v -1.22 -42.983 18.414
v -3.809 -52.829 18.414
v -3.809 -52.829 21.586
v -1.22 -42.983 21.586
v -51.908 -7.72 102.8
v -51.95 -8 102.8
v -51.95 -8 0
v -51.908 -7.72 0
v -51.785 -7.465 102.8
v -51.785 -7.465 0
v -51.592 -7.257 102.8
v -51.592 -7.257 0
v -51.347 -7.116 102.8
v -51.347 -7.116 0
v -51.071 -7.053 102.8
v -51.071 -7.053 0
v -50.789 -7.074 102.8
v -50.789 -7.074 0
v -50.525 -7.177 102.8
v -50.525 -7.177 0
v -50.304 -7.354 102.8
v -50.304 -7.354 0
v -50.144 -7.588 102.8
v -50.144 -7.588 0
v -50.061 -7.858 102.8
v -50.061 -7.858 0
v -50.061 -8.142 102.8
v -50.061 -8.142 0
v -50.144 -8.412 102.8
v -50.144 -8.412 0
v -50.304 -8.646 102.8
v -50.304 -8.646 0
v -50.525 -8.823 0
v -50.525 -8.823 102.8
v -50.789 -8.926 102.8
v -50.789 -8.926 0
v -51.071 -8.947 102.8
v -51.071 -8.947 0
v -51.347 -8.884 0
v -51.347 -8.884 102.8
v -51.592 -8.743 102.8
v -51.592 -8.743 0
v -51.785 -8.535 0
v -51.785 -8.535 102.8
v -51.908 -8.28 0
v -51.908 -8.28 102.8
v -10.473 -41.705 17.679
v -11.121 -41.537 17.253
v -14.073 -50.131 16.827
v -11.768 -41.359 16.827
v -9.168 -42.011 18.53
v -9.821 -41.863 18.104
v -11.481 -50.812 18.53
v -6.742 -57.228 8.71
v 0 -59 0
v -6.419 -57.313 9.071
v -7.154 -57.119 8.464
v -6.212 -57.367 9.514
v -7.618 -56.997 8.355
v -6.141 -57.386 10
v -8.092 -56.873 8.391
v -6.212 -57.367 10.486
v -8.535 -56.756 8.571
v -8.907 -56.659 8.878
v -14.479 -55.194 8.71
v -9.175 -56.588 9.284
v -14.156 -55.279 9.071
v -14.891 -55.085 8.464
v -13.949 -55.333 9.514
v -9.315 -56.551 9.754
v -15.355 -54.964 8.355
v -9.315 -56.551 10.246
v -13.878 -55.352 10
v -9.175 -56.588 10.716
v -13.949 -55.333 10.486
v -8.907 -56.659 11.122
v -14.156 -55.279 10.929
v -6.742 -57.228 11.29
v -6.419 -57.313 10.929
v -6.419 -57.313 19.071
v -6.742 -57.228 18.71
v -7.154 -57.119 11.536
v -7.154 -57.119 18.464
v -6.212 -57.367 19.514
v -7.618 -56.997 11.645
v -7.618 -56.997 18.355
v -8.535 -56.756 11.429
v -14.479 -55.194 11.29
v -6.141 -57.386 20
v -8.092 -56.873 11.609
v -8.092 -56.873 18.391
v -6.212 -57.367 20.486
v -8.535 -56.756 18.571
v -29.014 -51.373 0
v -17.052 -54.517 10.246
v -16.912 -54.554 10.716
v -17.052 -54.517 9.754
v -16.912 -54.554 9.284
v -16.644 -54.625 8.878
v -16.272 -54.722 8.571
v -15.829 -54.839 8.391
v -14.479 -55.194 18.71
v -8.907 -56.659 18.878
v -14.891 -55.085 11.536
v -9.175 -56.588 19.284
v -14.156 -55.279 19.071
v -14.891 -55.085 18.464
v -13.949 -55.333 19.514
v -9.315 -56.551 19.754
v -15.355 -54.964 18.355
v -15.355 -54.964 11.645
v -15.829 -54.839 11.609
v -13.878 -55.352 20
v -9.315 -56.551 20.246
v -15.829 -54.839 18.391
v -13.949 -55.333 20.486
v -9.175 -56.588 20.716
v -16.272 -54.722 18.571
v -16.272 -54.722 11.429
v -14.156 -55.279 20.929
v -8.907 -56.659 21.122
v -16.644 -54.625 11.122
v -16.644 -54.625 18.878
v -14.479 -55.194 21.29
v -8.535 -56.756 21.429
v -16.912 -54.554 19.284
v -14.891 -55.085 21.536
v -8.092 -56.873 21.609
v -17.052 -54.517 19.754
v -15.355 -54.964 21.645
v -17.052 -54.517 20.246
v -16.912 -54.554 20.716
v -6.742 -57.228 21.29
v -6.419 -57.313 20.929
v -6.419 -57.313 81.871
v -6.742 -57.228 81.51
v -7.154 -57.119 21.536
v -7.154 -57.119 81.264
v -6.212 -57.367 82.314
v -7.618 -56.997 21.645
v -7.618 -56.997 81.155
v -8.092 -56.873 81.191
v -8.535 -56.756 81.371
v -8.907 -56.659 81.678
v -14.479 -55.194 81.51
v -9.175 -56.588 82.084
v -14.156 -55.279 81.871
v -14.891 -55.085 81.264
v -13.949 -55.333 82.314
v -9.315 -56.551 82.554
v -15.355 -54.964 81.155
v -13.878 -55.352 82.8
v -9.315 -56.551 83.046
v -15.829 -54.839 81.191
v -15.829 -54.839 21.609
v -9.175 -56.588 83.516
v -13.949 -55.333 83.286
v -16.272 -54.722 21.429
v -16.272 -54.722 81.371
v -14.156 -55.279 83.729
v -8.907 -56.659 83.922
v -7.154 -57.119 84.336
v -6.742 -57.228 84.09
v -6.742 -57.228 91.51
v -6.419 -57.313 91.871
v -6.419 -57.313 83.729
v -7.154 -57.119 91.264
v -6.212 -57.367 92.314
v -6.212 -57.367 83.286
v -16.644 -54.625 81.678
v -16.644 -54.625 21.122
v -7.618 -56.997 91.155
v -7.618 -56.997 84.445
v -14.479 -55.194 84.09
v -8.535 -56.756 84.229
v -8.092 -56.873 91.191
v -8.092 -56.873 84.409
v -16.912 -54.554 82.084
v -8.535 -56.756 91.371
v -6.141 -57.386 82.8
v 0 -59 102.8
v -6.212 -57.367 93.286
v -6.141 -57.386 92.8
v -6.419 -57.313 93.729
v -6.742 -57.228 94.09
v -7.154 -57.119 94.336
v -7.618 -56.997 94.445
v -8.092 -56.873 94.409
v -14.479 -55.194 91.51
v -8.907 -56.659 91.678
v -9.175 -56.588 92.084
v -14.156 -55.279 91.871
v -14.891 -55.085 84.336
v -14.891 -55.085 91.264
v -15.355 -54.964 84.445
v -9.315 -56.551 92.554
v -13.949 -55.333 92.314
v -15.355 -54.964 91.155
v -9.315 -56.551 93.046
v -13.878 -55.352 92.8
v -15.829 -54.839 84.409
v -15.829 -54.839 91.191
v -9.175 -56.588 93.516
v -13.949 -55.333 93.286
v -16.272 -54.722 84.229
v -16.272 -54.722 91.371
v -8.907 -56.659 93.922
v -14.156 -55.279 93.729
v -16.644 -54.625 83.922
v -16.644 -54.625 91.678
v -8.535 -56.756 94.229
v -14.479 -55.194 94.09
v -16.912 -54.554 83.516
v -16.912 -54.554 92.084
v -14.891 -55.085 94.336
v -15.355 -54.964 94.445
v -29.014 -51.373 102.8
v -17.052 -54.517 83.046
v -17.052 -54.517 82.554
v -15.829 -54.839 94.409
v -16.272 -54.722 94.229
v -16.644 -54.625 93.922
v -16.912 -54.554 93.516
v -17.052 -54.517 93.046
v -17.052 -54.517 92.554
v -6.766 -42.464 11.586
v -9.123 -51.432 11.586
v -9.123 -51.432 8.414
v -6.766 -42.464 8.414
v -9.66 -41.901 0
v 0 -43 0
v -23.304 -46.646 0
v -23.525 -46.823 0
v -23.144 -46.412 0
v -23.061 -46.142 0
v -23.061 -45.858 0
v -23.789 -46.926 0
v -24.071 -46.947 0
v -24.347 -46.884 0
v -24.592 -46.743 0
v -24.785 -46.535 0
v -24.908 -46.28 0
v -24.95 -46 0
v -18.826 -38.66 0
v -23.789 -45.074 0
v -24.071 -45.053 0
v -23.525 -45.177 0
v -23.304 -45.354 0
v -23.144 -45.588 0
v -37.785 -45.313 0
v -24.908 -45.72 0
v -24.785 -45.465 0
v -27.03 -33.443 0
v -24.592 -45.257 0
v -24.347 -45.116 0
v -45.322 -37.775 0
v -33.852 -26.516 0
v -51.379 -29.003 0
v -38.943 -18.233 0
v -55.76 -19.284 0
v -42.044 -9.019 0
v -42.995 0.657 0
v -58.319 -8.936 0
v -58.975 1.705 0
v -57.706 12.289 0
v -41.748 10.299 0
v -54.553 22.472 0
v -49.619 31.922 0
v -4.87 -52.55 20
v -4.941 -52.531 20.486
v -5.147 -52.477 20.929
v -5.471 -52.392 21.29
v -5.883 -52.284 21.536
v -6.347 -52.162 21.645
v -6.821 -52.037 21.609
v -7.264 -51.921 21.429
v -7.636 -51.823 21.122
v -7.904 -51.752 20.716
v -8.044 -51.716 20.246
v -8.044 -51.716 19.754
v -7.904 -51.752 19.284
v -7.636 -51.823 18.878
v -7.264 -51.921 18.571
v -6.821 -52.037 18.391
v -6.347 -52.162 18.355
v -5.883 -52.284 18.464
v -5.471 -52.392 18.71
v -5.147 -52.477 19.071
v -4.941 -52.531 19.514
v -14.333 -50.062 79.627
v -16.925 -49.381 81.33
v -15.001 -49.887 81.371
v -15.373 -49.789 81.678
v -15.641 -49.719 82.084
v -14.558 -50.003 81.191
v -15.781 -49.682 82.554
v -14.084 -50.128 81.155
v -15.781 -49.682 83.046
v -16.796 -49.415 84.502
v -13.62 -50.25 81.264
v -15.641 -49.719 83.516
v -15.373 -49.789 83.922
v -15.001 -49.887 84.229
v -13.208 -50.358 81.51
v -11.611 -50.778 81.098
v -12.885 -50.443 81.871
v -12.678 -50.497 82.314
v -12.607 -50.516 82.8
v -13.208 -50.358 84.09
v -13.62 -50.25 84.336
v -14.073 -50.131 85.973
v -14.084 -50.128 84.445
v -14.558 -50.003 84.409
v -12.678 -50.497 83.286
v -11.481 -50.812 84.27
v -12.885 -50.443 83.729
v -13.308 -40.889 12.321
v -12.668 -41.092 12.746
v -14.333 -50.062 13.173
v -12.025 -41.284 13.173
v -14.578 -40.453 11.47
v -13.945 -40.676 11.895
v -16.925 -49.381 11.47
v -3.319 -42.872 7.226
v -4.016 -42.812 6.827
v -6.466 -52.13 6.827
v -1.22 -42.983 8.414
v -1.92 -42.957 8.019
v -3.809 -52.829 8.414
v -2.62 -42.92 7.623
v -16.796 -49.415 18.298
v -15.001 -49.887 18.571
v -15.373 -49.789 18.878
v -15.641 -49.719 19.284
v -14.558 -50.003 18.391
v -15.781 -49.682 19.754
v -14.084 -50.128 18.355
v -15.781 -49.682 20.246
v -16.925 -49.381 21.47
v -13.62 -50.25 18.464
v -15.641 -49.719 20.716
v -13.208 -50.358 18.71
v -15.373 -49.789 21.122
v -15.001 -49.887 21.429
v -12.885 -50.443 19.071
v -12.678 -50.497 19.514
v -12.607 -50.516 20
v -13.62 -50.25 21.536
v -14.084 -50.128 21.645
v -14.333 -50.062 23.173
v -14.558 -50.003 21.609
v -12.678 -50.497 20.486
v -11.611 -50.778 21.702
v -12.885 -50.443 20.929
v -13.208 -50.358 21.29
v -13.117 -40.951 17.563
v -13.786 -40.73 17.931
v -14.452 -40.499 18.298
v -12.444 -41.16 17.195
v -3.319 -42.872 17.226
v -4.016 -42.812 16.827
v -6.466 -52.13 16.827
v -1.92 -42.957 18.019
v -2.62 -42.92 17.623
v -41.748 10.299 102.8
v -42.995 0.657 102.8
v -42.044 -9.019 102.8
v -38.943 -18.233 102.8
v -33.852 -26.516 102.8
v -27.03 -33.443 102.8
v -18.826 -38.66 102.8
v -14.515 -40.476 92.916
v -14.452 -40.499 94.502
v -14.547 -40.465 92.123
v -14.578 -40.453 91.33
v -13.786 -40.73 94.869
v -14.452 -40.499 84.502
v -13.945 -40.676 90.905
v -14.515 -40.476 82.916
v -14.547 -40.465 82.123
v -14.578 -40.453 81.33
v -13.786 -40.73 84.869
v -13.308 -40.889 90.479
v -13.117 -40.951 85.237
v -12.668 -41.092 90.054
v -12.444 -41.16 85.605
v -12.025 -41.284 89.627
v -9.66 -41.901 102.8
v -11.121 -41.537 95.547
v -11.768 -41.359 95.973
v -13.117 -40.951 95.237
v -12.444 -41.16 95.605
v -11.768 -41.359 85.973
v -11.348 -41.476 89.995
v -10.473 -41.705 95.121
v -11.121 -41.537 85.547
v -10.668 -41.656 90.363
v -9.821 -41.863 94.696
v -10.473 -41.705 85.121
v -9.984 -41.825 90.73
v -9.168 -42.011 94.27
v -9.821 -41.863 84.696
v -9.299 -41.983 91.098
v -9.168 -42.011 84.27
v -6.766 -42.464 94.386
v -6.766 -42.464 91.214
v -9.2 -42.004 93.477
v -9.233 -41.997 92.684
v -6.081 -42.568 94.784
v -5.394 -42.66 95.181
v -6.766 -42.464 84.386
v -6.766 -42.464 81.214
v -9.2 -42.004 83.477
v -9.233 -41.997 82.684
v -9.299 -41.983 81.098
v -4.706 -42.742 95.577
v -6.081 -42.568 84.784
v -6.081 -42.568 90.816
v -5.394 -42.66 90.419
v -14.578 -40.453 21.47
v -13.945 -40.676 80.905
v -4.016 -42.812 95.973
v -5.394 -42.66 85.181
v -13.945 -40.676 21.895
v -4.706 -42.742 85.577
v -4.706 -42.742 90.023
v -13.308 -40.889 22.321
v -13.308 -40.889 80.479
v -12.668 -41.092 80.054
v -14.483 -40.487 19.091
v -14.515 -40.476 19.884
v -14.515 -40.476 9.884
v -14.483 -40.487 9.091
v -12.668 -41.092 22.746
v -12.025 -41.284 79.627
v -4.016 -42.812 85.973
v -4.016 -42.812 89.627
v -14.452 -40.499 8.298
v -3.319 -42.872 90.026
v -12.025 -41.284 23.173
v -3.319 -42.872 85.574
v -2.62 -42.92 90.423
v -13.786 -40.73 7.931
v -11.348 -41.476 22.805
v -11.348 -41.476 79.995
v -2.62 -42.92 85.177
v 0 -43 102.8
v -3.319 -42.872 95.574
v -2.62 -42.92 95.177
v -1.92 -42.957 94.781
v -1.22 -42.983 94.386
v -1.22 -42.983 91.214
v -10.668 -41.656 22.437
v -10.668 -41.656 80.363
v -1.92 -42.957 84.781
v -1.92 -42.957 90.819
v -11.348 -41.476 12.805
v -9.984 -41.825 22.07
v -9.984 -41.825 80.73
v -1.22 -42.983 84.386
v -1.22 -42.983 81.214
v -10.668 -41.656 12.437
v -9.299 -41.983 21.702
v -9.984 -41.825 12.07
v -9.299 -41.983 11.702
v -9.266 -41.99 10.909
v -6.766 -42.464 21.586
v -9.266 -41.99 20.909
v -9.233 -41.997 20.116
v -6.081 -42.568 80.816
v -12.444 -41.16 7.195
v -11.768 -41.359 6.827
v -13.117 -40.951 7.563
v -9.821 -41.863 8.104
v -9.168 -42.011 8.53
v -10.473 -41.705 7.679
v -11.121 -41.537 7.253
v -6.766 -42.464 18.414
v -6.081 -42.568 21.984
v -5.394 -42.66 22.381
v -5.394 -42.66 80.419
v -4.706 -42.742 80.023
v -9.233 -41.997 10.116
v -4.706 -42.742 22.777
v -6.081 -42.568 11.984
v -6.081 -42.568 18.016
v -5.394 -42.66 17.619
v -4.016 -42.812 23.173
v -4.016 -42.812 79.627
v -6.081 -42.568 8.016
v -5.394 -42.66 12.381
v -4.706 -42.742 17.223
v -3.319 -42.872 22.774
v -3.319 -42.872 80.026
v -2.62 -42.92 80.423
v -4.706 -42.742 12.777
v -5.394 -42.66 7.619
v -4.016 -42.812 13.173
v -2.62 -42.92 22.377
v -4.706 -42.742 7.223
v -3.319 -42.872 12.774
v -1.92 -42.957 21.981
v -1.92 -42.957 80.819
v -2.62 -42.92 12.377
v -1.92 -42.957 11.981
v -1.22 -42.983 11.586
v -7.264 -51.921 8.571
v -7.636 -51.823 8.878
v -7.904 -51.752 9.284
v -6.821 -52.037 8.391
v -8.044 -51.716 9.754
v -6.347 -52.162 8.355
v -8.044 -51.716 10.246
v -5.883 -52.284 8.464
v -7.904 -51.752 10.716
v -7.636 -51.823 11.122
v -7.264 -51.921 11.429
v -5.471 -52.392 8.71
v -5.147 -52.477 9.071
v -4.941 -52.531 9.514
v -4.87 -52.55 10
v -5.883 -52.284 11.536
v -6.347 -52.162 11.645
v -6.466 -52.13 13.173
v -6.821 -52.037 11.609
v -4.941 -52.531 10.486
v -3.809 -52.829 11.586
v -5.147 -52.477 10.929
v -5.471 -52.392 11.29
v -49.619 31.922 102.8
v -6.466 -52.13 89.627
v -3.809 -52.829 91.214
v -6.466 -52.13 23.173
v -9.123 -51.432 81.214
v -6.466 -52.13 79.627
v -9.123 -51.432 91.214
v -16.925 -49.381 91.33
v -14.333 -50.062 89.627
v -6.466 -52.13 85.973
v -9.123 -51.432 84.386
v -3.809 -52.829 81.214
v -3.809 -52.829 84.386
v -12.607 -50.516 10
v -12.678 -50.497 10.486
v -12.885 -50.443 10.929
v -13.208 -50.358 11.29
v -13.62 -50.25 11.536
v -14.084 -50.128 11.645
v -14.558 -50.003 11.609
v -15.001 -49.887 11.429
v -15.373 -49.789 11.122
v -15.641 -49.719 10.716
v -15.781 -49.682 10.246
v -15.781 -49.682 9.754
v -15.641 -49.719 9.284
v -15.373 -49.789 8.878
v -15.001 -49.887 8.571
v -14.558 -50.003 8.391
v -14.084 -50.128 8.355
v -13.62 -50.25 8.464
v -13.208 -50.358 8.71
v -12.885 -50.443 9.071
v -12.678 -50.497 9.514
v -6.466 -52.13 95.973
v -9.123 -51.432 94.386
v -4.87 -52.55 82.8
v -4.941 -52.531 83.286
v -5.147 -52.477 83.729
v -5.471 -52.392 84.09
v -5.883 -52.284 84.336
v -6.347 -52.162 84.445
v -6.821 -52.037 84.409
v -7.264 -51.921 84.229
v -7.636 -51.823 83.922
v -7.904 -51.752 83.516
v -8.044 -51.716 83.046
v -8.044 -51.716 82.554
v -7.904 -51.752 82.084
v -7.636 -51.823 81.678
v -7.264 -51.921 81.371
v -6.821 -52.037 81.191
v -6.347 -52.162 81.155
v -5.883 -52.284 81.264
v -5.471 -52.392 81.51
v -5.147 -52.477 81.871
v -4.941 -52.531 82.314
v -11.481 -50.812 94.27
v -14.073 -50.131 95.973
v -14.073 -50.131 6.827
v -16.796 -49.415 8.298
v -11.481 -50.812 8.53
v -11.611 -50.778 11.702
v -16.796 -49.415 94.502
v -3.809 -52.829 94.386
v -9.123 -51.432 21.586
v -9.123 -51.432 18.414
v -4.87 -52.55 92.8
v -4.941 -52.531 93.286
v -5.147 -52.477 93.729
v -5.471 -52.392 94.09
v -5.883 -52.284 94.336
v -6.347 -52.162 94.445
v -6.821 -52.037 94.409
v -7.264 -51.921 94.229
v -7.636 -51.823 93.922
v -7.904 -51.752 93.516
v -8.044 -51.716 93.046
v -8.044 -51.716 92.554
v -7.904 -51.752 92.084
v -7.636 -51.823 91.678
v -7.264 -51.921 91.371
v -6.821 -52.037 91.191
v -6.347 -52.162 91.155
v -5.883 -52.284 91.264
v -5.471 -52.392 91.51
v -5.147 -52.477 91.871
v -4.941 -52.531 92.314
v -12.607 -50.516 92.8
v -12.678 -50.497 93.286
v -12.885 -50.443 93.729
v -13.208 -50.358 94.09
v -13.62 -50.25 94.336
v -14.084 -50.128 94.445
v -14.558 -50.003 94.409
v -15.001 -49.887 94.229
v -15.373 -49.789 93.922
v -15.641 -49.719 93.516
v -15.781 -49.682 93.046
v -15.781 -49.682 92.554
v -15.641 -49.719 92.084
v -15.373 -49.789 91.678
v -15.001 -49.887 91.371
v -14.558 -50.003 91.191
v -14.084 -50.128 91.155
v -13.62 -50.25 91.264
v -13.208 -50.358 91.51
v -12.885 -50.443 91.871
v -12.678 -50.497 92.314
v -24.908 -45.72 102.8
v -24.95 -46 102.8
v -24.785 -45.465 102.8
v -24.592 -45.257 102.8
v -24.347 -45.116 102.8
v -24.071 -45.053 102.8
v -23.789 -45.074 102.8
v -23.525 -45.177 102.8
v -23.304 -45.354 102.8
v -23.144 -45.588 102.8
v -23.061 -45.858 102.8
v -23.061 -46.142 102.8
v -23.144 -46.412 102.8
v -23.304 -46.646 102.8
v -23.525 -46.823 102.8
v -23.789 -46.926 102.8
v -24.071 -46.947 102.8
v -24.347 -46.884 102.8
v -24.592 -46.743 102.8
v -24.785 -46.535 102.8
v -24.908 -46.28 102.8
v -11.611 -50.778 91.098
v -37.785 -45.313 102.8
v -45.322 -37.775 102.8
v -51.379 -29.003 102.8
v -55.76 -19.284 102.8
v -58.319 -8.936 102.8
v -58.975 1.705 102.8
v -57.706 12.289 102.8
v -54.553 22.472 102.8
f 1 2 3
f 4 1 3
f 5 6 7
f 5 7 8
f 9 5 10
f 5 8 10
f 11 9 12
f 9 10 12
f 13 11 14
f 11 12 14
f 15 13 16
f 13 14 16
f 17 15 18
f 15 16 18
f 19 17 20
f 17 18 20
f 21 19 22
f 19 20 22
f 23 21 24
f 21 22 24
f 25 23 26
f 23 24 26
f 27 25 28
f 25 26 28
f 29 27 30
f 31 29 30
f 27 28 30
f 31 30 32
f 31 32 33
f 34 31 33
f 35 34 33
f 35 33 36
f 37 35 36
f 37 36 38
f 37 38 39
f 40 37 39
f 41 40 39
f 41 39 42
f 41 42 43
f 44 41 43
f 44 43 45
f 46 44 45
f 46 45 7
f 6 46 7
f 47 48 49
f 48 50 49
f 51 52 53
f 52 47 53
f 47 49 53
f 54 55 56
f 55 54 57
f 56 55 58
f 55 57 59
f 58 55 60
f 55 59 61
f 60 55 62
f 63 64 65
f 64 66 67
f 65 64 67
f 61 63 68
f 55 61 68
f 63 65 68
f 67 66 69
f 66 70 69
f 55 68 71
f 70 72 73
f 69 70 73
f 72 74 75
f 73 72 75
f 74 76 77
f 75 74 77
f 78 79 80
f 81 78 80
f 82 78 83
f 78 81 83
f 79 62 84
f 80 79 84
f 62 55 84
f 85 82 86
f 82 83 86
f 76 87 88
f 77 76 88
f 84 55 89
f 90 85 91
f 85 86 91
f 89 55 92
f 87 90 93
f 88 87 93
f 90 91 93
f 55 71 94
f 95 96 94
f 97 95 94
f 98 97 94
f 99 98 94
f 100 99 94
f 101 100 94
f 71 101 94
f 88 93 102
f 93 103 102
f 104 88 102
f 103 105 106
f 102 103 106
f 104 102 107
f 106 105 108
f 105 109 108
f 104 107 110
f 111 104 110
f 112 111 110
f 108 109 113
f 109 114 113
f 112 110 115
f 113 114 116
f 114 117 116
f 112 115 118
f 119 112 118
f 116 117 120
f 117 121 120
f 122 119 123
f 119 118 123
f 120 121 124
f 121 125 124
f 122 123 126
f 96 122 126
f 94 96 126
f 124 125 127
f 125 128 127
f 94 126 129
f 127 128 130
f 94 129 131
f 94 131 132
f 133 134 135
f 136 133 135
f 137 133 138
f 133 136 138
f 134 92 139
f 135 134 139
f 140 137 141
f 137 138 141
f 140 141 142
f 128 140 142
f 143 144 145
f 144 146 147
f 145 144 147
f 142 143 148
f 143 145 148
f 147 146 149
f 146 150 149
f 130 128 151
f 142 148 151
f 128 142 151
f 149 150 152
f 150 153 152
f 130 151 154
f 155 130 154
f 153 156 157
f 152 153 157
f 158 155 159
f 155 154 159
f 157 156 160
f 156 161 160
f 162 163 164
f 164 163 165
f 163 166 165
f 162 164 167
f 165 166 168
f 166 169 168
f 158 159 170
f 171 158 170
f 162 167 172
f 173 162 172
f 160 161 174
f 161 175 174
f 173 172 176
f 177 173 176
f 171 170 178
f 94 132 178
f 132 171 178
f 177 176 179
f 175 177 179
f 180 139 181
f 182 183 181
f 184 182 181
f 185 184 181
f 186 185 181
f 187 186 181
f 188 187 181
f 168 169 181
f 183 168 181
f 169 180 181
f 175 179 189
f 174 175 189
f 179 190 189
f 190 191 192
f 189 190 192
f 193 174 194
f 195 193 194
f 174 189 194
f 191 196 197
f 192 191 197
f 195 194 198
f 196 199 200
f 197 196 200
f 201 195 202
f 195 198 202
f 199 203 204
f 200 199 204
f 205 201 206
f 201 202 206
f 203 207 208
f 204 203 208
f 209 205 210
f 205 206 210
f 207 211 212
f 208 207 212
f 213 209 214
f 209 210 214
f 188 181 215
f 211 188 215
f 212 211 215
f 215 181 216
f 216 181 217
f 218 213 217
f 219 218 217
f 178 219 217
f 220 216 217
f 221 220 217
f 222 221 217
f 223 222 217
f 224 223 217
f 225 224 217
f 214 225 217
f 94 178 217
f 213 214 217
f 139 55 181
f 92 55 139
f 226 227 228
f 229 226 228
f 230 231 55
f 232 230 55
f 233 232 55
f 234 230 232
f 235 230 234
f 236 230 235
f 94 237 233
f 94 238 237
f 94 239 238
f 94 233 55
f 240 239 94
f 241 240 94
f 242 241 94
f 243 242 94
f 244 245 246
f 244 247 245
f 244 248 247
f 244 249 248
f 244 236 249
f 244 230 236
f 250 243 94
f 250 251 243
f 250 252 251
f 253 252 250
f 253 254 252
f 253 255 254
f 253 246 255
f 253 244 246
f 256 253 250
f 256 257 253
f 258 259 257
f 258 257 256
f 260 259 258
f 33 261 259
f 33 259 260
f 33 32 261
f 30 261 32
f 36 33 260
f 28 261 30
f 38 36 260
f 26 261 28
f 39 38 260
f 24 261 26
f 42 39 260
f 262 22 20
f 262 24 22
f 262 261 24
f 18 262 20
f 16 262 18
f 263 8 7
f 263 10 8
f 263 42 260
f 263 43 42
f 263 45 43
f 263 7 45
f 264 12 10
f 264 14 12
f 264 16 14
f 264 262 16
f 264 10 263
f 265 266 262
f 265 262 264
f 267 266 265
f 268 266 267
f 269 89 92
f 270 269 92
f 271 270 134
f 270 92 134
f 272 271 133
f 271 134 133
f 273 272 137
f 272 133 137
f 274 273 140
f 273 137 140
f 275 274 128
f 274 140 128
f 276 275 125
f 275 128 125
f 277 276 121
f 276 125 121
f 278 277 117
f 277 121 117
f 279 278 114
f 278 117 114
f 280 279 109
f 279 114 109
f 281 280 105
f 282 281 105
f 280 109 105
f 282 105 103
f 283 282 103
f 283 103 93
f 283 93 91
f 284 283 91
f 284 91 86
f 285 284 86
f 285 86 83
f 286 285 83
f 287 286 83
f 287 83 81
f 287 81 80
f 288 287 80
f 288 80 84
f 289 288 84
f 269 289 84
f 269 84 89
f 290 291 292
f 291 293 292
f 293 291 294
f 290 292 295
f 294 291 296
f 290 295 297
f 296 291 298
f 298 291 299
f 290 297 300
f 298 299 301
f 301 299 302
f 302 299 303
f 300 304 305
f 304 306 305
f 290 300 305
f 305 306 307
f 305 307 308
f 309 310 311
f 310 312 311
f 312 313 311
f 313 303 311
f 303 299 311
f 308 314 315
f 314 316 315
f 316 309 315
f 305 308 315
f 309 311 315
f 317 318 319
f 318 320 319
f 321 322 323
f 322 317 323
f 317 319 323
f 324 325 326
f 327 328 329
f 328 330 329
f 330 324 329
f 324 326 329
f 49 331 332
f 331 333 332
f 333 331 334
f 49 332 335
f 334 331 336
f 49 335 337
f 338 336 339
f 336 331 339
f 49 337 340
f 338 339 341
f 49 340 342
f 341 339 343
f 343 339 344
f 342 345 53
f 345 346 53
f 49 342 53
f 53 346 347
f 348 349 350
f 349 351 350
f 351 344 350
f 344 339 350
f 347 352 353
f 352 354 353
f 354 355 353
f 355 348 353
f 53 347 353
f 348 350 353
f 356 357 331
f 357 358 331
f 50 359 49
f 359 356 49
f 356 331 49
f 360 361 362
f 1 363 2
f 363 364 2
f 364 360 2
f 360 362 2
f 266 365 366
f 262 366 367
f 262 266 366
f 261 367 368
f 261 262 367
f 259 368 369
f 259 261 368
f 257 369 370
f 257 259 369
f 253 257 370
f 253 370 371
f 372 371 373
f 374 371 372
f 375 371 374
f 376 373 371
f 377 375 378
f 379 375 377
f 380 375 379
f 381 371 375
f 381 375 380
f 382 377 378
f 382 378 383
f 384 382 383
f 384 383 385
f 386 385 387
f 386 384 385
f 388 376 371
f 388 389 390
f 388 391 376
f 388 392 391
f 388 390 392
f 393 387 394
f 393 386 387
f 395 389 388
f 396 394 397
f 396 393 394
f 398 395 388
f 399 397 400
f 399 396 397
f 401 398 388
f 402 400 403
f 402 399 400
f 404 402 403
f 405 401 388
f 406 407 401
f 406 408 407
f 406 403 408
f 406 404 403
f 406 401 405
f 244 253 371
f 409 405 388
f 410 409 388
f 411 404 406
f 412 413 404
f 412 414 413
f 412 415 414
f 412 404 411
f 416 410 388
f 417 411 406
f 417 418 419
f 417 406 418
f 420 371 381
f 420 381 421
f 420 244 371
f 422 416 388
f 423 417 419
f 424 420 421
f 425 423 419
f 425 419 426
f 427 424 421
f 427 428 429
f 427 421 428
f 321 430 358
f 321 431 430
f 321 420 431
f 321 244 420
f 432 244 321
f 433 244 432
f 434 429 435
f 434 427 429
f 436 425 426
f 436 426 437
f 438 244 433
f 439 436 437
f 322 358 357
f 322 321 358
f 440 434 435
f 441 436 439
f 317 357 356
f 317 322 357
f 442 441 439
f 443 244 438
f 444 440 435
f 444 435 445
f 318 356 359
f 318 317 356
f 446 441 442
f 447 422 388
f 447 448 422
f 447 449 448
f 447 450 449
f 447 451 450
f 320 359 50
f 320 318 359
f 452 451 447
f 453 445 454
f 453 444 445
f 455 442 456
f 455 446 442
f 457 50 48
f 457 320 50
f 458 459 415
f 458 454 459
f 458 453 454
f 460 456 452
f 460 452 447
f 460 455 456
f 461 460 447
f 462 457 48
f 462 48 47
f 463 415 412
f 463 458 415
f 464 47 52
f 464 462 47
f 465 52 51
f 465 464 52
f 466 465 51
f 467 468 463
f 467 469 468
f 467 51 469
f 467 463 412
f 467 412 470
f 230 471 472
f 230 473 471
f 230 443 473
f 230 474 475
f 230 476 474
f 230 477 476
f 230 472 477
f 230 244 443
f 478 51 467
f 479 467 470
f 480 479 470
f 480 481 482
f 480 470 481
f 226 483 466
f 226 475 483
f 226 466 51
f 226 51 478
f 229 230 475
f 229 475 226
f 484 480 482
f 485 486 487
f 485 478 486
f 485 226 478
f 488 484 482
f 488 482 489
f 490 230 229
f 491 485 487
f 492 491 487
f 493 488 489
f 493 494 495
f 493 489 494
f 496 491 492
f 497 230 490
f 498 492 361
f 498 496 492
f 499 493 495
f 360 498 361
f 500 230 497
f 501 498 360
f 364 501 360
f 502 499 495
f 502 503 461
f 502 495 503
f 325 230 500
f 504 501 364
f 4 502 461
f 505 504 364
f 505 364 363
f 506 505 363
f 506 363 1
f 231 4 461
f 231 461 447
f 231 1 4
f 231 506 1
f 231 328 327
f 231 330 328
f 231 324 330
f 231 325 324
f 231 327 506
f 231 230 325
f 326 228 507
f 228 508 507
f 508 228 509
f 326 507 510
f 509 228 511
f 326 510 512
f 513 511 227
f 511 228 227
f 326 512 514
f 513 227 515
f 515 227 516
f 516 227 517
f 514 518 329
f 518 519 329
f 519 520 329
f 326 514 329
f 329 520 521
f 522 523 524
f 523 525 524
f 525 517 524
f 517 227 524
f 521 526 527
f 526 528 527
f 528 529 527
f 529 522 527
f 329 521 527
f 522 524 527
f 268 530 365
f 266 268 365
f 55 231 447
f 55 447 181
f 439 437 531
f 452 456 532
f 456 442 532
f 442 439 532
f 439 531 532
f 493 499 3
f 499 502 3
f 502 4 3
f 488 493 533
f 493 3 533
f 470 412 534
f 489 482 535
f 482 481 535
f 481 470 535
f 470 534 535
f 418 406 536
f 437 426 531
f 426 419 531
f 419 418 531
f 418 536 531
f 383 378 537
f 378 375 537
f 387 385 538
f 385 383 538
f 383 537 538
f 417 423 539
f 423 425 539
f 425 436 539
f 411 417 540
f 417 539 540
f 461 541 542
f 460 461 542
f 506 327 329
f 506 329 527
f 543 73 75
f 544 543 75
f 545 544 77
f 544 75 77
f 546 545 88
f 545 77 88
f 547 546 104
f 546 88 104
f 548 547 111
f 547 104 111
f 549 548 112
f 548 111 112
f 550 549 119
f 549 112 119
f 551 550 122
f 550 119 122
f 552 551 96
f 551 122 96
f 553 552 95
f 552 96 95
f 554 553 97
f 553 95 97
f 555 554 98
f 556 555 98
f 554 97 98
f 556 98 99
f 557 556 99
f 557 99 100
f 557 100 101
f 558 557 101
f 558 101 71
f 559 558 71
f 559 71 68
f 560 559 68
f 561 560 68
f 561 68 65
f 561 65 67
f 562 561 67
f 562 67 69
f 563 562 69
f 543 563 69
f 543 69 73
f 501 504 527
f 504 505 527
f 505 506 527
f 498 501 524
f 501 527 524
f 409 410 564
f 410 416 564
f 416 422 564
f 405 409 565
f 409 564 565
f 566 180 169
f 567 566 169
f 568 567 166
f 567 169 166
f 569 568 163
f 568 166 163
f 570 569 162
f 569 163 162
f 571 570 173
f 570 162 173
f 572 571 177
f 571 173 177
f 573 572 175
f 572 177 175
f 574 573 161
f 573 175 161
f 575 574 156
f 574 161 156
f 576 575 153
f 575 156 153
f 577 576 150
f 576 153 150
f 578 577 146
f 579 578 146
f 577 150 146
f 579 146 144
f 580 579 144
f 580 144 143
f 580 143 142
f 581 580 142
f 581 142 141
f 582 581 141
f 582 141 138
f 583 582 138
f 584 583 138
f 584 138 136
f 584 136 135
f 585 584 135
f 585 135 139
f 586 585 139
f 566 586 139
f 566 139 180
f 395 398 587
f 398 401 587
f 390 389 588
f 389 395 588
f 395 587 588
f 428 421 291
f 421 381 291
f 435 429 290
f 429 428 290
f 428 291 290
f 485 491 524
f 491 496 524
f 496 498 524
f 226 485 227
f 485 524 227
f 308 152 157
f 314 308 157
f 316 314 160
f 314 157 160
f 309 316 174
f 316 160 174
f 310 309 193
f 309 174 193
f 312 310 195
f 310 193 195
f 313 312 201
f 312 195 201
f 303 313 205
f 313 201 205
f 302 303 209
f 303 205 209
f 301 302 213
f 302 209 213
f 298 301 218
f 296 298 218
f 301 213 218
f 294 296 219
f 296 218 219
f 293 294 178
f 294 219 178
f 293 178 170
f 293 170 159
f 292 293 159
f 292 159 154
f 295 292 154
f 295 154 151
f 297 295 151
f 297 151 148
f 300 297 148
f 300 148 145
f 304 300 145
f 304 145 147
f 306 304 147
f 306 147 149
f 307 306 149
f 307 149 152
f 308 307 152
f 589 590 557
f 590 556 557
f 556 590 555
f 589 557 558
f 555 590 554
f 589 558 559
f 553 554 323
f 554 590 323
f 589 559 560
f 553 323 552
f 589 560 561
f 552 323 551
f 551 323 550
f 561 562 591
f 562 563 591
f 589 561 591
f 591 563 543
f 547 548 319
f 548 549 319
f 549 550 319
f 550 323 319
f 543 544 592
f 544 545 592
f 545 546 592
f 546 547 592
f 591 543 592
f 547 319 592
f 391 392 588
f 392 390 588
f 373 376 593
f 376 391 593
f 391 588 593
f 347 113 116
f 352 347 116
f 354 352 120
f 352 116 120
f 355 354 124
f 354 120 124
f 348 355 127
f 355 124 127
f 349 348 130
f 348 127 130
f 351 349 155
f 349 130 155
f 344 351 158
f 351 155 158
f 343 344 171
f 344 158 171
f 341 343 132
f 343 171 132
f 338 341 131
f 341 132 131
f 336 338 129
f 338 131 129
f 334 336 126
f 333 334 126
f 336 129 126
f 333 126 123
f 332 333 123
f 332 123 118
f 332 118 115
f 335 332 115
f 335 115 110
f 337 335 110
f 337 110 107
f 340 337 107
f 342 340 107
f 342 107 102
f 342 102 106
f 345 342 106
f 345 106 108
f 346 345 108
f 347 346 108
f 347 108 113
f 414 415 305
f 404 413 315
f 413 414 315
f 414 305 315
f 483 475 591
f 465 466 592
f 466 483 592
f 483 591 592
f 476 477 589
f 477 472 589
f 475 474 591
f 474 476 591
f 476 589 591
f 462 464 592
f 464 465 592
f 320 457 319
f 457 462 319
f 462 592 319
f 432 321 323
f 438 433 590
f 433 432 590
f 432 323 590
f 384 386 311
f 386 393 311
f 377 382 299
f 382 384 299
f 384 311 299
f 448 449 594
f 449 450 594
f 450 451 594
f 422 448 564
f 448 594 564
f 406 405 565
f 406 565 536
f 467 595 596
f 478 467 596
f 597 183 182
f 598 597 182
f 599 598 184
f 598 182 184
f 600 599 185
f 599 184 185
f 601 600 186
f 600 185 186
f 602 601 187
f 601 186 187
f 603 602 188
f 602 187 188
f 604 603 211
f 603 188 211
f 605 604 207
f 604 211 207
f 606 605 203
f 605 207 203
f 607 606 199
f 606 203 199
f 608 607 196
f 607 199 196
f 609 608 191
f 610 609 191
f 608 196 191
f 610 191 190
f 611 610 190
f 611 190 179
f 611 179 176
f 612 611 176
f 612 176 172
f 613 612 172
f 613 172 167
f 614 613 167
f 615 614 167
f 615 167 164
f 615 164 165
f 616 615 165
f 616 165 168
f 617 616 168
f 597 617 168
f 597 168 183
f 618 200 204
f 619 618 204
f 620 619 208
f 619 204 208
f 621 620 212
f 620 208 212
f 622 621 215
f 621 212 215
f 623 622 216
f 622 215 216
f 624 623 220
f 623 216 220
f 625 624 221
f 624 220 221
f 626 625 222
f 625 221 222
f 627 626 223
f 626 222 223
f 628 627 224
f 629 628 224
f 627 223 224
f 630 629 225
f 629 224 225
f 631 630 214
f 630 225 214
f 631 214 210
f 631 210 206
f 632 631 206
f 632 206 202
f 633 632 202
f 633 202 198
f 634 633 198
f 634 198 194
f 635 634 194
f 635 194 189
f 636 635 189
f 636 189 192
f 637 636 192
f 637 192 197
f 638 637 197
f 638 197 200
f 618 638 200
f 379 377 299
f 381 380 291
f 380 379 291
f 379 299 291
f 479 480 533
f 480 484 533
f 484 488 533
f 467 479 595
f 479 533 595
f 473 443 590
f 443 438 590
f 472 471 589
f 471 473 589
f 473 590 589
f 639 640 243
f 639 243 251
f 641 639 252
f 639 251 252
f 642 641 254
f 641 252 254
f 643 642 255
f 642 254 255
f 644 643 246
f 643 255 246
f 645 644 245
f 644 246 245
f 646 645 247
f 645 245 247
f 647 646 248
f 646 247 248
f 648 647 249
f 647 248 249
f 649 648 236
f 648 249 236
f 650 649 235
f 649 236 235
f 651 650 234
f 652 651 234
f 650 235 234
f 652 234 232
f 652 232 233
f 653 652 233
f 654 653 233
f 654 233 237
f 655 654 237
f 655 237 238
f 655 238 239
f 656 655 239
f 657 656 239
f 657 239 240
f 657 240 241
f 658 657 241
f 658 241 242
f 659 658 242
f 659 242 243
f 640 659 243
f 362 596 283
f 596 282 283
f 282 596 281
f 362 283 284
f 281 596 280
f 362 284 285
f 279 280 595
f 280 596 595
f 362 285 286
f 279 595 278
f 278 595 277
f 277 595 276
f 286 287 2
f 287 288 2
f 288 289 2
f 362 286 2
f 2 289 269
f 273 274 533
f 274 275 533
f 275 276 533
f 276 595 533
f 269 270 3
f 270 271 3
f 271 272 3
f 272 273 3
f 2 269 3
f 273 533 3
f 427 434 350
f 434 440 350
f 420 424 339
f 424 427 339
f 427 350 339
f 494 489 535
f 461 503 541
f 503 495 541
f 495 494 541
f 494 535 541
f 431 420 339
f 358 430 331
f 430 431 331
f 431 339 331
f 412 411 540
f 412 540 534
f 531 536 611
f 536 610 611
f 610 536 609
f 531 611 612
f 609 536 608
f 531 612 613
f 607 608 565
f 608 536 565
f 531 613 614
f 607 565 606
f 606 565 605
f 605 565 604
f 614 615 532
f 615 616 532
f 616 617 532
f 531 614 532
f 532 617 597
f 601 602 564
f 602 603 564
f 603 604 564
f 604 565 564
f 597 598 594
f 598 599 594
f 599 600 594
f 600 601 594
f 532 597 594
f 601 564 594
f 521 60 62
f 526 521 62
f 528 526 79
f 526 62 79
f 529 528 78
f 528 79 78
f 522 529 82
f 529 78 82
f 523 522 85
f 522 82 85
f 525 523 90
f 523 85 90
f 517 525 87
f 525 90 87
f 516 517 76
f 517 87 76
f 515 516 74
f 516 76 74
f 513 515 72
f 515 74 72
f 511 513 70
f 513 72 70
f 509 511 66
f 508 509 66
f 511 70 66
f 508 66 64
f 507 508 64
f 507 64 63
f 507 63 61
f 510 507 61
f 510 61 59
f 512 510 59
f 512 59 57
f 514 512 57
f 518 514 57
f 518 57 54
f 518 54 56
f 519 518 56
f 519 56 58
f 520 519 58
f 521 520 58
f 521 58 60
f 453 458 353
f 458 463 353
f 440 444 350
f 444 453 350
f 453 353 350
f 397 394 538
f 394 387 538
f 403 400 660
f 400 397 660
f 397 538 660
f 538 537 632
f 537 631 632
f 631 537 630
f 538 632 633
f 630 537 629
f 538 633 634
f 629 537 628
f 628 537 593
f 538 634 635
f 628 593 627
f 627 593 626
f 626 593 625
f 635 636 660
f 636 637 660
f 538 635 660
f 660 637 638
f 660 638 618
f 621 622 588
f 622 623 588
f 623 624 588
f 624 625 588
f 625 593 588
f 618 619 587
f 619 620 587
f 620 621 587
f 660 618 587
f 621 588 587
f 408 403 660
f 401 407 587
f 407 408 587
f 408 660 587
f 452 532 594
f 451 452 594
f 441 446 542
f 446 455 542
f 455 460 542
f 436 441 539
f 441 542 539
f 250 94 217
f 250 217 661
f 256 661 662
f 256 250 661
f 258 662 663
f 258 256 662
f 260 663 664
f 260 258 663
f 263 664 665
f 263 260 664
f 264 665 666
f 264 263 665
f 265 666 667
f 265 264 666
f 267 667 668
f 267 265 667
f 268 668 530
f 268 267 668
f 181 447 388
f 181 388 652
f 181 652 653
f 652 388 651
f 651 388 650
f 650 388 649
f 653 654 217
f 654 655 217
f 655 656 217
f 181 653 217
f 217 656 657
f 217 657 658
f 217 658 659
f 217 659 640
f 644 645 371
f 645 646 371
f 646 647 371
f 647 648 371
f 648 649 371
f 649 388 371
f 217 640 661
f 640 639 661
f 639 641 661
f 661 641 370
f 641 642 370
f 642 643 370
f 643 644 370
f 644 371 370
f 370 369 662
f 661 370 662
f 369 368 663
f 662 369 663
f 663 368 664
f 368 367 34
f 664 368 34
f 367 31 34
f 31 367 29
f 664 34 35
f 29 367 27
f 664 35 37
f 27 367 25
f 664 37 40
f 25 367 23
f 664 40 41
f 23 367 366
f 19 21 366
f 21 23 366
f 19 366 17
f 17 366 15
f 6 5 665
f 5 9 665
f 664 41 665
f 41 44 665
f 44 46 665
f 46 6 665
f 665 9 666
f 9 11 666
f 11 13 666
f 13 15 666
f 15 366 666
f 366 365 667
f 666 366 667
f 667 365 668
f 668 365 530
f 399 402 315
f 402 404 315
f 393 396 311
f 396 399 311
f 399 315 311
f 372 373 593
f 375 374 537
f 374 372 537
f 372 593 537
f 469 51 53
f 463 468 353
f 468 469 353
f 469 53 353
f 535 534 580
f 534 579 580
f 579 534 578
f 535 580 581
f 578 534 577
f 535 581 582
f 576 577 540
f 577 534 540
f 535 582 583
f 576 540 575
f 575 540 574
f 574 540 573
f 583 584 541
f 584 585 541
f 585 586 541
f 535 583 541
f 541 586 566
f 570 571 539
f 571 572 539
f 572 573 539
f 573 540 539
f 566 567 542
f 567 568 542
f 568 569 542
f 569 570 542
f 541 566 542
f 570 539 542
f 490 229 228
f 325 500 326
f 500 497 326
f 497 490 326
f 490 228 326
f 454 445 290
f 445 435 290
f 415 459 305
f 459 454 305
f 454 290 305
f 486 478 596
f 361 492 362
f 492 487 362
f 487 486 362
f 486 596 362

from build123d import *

# Parameters (mm, degrees)
BOSS_EXTRUDE1_DEPTH = 102.8
CUT_EXTRUDE1_DEPTH  = 103.8
CUT_EXTRUDE2_DEPTH  = 103.8
CUT_EXTRUDE3_REACH  = 89.934
SKETCH5_R           = 1.65
CUT_EXTRUDE4_START  = -5
CUT_EXTRUDE4_DEPTH  = 83.934228689
SKETCH7_R           = 0.95
CUT_EXTRUDE5_DEPTH  = 103.8


with BuildPart() as part:
    # Sketch1 → Boss-Extrude1 (new body)
    with BuildSketch(Plane.XY):
        with BuildLine():
            Line((0, 59), (0, 43))
            ThreePointArc((0, 43), (-43, 0), (0, -43))
            Line((0, -43), (0, -59))
            ThreePointArc((0, -59), (-59, 0), (0, 59))
        make_face()
    extrude(amount=BOSS_EXTRUDE1_DEPTH)

    # Sketch3 → Cut-Extrude1 (cut, through all)
    with BuildSketch(Plane.XY.offset(102.8)):
        Polygon((0, 0), (0, 90), (-70.757321084, 90), (-38, 0), align=None)
    extrude(amount=-CUT_EXTRUDE1_DEPTH, mode=Mode.SUBTRACT)

    # Sketch4 → Cut-Extrude2 (cut, through all)
    with BuildSketch(Plane.XY.offset(102.8)):
        Polygon((0, -59), (-29.014256172, -51.372881356), (-31.019233948, -59), align=None)
    extrude(amount=-CUT_EXTRUDE2_DEPTH, mode=Mode.SUBTRACT)

    # Sketch5 → Cut-Extrude3 (cut, up to next)
    with BuildSketch(Plane(origin=(-14.507128086, -55.186440678, 0), x_dir=(0.967141872, -0.254237288, 0), z_dir=(-0.254237288, -0.967141872, 0)), mode=Mode.PRIVATE) as cut_extrude3_sk1:
        with Locations((-1, 20)):
            Circle(SKETCH5_R)
    cut_extrude3_tool1 = extrude(cut_extrude3_sk1.sketch, amount=-CUT_EXTRUDE3_REACH, mode=Mode.PRIVATE) & part.part
    add(cut_extrude3_tool1.solids().sort_by_distance((-15.47427, -54.932203, 20))[0], mode=Mode.SUBTRACT)
    # Sketch5 → Cut-Extrude3 (cut, up to next)
    with BuildSketch(Plane(origin=(-14.507128086, -55.186440678, 0), x_dir=(0.967141872, -0.254237288, 0), z_dir=(-0.254237288, -0.967141872, 0)), mode=Mode.PRIVATE) as cut_extrude3_sk2:
        with Locations((-1, 10)):
            Circle(SKETCH5_R)
    cut_extrude3_tool2 = extrude(cut_extrude3_sk2.sketch, amount=-CUT_EXTRUDE3_REACH, mode=Mode.PRIVATE) & part.part
    add(cut_extrude3_tool2.solids().sort_by_distance((-15.47427, -54.932203, 10))[0], mode=Mode.SUBTRACT)
    # Sketch5 → Cut-Extrude3 (cut, up to next)
    with BuildSketch(Plane(origin=(-14.507128086, -55.186440678, 0), x_dir=(0.967141872, -0.254237288, 0), z_dir=(-0.254237288, -0.967141872, 0)), mode=Mode.PRIVATE) as cut_extrude3_sk3:
        with Locations((-1, 92.8)):
            Circle(SKETCH5_R)
    cut_extrude3_tool3 = extrude(cut_extrude3_sk3.sketch, amount=-CUT_EXTRUDE3_REACH, mode=Mode.PRIVATE) & part.part
    add(cut_extrude3_tool3.solids().sort_by_distance((-15.47427, -54.932203, 92.8))[0], mode=Mode.SUBTRACT)
    # Sketch5 → Cut-Extrude3 (cut, up to next)
    with BuildSketch(Plane(origin=(-14.507128086, -55.186440678, 0), x_dir=(0.967141872, -0.254237288, 0), z_dir=(-0.254237288, -0.967141872, 0)), mode=Mode.PRIVATE) as cut_extrude3_sk4:
        with Locations((-1, 82.8)):
            Circle(SKETCH5_R)
    cut_extrude3_tool4 = extrude(cut_extrude3_sk4.sketch, amount=-CUT_EXTRUDE3_REACH, mode=Mode.PRIVATE) & part.part
    add(cut_extrude3_tool4.solids().sort_by_distance((-15.47427, -54.932203, 82.8))[0], mode=Mode.SUBTRACT)
    # Sketch5 → Cut-Extrude3 (cut, up to next)
    with BuildSketch(Plane(origin=(-14.507128086, -55.186440678, 0), x_dir=(0.967141872, -0.254237288, 0), z_dir=(-0.254237288, -0.967141872, 0)), mode=Mode.PRIVATE) as cut_extrude3_sk5:
        with Locations((7, 20)):
            Circle(SKETCH5_R)
    cut_extrude3_tool5 = extrude(cut_extrude3_sk5.sketch, amount=-CUT_EXTRUDE3_REACH, mode=Mode.PRIVATE) & part.part
    add(cut_extrude3_tool5.solids().sort_by_distance((-7.737135, -56.966102, 20))[0], mode=Mode.SUBTRACT)
    # Sketch5 → Cut-Extrude3 (cut, up to next)
    with BuildSketch(Plane(origin=(-14.507128086, -55.186440678, 0), x_dir=(0.967141872, -0.254237288, 0), z_dir=(-0.254237288, -0.967141872, 0)), mode=Mode.PRIVATE) as cut_extrude3_sk6:
        with Locations((7, 10)):
            Circle(SKETCH5_R)
    cut_extrude3_tool6 = extrude(cut_extrude3_sk6.sketch, amount=-CUT_EXTRUDE3_REACH, mode=Mode.PRIVATE) & part.part
    add(cut_extrude3_tool6.solids().sort_by_distance((-7.737135, -56.966102, 10))[0], mode=Mode.SUBTRACT)
    # Sketch5 → Cut-Extrude3 (cut, up to next)
    with BuildSketch(Plane(origin=(-14.507128086, -55.186440678, 0), x_dir=(0.967141872, -0.254237288, 0), z_dir=(-0.254237288, -0.967141872, 0)), mode=Mode.PRIVATE) as cut_extrude3_sk7:
        with Locations((7, 92.8)):
            Circle(SKETCH5_R)
    cut_extrude3_tool7 = extrude(cut_extrude3_sk7.sketch, amount=-CUT_EXTRUDE3_REACH, mode=Mode.PRIVATE) & part.part
    add(cut_extrude3_tool7.solids().sort_by_distance((-7.737135, -56.966102, 92.8))[0], mode=Mode.SUBTRACT)
    # Sketch5 → Cut-Extrude3 (cut, up to next)
    with BuildSketch(Plane(origin=(-14.507128086, -55.186440678, 0), x_dir=(0.967141872, -0.254237288, 0), z_dir=(-0.254237288, -0.967141872, 0)), mode=Mode.PRIVATE) as cut_extrude3_sk8:
        with Locations((7, 82.8)):
            Circle(SKETCH5_R)
    cut_extrude3_tool8 = extrude(cut_extrude3_sk8.sketch, amount=-CUT_EXTRUDE3_REACH, mode=Mode.PRIVATE) & part.part
    add(cut_extrude3_tool8.solids().sort_by_distance((-7.737135, -56.966102, 82.8))[0], mode=Mode.SUBTRACT)

    # Sketch6 → Cut-Extrude4 (cut, through all)
    with BuildSketch(Plane(origin=(-14.507128086, -55.186440678, 0), x_dir=(0.967141872, -0.254237288, 0), z_dir=(-0.254237288, -0.967141872, 0)).offset(CUT_EXTRUDE4_START)):
        Polygon((7, 95.972596752), (4.252450617, 94.386298376), (4.252450617, 91.213701624), (7, 89.627403248), (9.747549383, 91.213701624), (9.747549383, 94.386298376), align=None)
        Polygon((1.680535984, 91.097631011), (1.814562783, 94.270227763), (-0.865973201, 95.972596752), (-3.680535984, 94.502368989), (-3.814562783, 91.329772237), (-1.134026799, 89.627403248), align=None)
        Polygon((1.680535984, 81.097631011), (1.814562783, 84.270227763), (-0.865973201, 85.972596752), (-3.680535984, 84.502368989), (-3.814562783, 81.329772237), (-1.134026799, 79.627403248), align=None)
        Polygon((1.680535984, 21.702368989), (-1.134026799, 23.172596752), (-3.814562783, 21.470227763), (-3.680535984, 18.297631011), (-0.865973201, 16.827403248), (1.814562783, 18.529772237), align=None)
        Polygon((1.680535984, 11.702368989), (-1.134026799, 13.172596752), (-3.814562783, 11.470227763), (-3.680535984, 8.297631011), (-0.865973201, 6.827403248), (1.814562783, 8.529772237), align=None)
        Polygon((7, 85.972596752), (4.252450617, 84.386298376), (4.252450617, 81.213701624), (7, 79.627403248), (9.747549383, 81.213701624), (9.747549383, 84.386298376), align=None)
        Polygon((7, 23.172596752), (4.252450617, 21.586298376), (4.252450617, 18.413701624), (7, 16.827403248), (9.747549383, 18.413701624), (9.747549383, 21.586298376), align=None)
        Polygon((7, 13.172596752), (4.252450617, 11.586298376), (4.252450617, 8.413701624), (7, 6.827403248), (9.747549383, 8.413701624), (9.747549383, 11.586298376), align=None)
    extrude(amount=-CUT_EXTRUDE4_DEPTH, mode=Mode.SUBTRACT)

    # Sketch7 → Cut-Extrude5 (cut, through all)
    with BuildSketch(Plane(origin=(0, 0, 0), x_dir=(-1, 0, 0), z_dir=(0, 0, -1))):
        with Locations((24, -46)):
            Circle(SKETCH7_R)
        with Locations((51, -8)):
            Circle(SKETCH7_R)
    extrude(amount=-CUT_EXTRUDE5_DEPTH, mode=Mode.SUBTRACT)


solid = part.part
